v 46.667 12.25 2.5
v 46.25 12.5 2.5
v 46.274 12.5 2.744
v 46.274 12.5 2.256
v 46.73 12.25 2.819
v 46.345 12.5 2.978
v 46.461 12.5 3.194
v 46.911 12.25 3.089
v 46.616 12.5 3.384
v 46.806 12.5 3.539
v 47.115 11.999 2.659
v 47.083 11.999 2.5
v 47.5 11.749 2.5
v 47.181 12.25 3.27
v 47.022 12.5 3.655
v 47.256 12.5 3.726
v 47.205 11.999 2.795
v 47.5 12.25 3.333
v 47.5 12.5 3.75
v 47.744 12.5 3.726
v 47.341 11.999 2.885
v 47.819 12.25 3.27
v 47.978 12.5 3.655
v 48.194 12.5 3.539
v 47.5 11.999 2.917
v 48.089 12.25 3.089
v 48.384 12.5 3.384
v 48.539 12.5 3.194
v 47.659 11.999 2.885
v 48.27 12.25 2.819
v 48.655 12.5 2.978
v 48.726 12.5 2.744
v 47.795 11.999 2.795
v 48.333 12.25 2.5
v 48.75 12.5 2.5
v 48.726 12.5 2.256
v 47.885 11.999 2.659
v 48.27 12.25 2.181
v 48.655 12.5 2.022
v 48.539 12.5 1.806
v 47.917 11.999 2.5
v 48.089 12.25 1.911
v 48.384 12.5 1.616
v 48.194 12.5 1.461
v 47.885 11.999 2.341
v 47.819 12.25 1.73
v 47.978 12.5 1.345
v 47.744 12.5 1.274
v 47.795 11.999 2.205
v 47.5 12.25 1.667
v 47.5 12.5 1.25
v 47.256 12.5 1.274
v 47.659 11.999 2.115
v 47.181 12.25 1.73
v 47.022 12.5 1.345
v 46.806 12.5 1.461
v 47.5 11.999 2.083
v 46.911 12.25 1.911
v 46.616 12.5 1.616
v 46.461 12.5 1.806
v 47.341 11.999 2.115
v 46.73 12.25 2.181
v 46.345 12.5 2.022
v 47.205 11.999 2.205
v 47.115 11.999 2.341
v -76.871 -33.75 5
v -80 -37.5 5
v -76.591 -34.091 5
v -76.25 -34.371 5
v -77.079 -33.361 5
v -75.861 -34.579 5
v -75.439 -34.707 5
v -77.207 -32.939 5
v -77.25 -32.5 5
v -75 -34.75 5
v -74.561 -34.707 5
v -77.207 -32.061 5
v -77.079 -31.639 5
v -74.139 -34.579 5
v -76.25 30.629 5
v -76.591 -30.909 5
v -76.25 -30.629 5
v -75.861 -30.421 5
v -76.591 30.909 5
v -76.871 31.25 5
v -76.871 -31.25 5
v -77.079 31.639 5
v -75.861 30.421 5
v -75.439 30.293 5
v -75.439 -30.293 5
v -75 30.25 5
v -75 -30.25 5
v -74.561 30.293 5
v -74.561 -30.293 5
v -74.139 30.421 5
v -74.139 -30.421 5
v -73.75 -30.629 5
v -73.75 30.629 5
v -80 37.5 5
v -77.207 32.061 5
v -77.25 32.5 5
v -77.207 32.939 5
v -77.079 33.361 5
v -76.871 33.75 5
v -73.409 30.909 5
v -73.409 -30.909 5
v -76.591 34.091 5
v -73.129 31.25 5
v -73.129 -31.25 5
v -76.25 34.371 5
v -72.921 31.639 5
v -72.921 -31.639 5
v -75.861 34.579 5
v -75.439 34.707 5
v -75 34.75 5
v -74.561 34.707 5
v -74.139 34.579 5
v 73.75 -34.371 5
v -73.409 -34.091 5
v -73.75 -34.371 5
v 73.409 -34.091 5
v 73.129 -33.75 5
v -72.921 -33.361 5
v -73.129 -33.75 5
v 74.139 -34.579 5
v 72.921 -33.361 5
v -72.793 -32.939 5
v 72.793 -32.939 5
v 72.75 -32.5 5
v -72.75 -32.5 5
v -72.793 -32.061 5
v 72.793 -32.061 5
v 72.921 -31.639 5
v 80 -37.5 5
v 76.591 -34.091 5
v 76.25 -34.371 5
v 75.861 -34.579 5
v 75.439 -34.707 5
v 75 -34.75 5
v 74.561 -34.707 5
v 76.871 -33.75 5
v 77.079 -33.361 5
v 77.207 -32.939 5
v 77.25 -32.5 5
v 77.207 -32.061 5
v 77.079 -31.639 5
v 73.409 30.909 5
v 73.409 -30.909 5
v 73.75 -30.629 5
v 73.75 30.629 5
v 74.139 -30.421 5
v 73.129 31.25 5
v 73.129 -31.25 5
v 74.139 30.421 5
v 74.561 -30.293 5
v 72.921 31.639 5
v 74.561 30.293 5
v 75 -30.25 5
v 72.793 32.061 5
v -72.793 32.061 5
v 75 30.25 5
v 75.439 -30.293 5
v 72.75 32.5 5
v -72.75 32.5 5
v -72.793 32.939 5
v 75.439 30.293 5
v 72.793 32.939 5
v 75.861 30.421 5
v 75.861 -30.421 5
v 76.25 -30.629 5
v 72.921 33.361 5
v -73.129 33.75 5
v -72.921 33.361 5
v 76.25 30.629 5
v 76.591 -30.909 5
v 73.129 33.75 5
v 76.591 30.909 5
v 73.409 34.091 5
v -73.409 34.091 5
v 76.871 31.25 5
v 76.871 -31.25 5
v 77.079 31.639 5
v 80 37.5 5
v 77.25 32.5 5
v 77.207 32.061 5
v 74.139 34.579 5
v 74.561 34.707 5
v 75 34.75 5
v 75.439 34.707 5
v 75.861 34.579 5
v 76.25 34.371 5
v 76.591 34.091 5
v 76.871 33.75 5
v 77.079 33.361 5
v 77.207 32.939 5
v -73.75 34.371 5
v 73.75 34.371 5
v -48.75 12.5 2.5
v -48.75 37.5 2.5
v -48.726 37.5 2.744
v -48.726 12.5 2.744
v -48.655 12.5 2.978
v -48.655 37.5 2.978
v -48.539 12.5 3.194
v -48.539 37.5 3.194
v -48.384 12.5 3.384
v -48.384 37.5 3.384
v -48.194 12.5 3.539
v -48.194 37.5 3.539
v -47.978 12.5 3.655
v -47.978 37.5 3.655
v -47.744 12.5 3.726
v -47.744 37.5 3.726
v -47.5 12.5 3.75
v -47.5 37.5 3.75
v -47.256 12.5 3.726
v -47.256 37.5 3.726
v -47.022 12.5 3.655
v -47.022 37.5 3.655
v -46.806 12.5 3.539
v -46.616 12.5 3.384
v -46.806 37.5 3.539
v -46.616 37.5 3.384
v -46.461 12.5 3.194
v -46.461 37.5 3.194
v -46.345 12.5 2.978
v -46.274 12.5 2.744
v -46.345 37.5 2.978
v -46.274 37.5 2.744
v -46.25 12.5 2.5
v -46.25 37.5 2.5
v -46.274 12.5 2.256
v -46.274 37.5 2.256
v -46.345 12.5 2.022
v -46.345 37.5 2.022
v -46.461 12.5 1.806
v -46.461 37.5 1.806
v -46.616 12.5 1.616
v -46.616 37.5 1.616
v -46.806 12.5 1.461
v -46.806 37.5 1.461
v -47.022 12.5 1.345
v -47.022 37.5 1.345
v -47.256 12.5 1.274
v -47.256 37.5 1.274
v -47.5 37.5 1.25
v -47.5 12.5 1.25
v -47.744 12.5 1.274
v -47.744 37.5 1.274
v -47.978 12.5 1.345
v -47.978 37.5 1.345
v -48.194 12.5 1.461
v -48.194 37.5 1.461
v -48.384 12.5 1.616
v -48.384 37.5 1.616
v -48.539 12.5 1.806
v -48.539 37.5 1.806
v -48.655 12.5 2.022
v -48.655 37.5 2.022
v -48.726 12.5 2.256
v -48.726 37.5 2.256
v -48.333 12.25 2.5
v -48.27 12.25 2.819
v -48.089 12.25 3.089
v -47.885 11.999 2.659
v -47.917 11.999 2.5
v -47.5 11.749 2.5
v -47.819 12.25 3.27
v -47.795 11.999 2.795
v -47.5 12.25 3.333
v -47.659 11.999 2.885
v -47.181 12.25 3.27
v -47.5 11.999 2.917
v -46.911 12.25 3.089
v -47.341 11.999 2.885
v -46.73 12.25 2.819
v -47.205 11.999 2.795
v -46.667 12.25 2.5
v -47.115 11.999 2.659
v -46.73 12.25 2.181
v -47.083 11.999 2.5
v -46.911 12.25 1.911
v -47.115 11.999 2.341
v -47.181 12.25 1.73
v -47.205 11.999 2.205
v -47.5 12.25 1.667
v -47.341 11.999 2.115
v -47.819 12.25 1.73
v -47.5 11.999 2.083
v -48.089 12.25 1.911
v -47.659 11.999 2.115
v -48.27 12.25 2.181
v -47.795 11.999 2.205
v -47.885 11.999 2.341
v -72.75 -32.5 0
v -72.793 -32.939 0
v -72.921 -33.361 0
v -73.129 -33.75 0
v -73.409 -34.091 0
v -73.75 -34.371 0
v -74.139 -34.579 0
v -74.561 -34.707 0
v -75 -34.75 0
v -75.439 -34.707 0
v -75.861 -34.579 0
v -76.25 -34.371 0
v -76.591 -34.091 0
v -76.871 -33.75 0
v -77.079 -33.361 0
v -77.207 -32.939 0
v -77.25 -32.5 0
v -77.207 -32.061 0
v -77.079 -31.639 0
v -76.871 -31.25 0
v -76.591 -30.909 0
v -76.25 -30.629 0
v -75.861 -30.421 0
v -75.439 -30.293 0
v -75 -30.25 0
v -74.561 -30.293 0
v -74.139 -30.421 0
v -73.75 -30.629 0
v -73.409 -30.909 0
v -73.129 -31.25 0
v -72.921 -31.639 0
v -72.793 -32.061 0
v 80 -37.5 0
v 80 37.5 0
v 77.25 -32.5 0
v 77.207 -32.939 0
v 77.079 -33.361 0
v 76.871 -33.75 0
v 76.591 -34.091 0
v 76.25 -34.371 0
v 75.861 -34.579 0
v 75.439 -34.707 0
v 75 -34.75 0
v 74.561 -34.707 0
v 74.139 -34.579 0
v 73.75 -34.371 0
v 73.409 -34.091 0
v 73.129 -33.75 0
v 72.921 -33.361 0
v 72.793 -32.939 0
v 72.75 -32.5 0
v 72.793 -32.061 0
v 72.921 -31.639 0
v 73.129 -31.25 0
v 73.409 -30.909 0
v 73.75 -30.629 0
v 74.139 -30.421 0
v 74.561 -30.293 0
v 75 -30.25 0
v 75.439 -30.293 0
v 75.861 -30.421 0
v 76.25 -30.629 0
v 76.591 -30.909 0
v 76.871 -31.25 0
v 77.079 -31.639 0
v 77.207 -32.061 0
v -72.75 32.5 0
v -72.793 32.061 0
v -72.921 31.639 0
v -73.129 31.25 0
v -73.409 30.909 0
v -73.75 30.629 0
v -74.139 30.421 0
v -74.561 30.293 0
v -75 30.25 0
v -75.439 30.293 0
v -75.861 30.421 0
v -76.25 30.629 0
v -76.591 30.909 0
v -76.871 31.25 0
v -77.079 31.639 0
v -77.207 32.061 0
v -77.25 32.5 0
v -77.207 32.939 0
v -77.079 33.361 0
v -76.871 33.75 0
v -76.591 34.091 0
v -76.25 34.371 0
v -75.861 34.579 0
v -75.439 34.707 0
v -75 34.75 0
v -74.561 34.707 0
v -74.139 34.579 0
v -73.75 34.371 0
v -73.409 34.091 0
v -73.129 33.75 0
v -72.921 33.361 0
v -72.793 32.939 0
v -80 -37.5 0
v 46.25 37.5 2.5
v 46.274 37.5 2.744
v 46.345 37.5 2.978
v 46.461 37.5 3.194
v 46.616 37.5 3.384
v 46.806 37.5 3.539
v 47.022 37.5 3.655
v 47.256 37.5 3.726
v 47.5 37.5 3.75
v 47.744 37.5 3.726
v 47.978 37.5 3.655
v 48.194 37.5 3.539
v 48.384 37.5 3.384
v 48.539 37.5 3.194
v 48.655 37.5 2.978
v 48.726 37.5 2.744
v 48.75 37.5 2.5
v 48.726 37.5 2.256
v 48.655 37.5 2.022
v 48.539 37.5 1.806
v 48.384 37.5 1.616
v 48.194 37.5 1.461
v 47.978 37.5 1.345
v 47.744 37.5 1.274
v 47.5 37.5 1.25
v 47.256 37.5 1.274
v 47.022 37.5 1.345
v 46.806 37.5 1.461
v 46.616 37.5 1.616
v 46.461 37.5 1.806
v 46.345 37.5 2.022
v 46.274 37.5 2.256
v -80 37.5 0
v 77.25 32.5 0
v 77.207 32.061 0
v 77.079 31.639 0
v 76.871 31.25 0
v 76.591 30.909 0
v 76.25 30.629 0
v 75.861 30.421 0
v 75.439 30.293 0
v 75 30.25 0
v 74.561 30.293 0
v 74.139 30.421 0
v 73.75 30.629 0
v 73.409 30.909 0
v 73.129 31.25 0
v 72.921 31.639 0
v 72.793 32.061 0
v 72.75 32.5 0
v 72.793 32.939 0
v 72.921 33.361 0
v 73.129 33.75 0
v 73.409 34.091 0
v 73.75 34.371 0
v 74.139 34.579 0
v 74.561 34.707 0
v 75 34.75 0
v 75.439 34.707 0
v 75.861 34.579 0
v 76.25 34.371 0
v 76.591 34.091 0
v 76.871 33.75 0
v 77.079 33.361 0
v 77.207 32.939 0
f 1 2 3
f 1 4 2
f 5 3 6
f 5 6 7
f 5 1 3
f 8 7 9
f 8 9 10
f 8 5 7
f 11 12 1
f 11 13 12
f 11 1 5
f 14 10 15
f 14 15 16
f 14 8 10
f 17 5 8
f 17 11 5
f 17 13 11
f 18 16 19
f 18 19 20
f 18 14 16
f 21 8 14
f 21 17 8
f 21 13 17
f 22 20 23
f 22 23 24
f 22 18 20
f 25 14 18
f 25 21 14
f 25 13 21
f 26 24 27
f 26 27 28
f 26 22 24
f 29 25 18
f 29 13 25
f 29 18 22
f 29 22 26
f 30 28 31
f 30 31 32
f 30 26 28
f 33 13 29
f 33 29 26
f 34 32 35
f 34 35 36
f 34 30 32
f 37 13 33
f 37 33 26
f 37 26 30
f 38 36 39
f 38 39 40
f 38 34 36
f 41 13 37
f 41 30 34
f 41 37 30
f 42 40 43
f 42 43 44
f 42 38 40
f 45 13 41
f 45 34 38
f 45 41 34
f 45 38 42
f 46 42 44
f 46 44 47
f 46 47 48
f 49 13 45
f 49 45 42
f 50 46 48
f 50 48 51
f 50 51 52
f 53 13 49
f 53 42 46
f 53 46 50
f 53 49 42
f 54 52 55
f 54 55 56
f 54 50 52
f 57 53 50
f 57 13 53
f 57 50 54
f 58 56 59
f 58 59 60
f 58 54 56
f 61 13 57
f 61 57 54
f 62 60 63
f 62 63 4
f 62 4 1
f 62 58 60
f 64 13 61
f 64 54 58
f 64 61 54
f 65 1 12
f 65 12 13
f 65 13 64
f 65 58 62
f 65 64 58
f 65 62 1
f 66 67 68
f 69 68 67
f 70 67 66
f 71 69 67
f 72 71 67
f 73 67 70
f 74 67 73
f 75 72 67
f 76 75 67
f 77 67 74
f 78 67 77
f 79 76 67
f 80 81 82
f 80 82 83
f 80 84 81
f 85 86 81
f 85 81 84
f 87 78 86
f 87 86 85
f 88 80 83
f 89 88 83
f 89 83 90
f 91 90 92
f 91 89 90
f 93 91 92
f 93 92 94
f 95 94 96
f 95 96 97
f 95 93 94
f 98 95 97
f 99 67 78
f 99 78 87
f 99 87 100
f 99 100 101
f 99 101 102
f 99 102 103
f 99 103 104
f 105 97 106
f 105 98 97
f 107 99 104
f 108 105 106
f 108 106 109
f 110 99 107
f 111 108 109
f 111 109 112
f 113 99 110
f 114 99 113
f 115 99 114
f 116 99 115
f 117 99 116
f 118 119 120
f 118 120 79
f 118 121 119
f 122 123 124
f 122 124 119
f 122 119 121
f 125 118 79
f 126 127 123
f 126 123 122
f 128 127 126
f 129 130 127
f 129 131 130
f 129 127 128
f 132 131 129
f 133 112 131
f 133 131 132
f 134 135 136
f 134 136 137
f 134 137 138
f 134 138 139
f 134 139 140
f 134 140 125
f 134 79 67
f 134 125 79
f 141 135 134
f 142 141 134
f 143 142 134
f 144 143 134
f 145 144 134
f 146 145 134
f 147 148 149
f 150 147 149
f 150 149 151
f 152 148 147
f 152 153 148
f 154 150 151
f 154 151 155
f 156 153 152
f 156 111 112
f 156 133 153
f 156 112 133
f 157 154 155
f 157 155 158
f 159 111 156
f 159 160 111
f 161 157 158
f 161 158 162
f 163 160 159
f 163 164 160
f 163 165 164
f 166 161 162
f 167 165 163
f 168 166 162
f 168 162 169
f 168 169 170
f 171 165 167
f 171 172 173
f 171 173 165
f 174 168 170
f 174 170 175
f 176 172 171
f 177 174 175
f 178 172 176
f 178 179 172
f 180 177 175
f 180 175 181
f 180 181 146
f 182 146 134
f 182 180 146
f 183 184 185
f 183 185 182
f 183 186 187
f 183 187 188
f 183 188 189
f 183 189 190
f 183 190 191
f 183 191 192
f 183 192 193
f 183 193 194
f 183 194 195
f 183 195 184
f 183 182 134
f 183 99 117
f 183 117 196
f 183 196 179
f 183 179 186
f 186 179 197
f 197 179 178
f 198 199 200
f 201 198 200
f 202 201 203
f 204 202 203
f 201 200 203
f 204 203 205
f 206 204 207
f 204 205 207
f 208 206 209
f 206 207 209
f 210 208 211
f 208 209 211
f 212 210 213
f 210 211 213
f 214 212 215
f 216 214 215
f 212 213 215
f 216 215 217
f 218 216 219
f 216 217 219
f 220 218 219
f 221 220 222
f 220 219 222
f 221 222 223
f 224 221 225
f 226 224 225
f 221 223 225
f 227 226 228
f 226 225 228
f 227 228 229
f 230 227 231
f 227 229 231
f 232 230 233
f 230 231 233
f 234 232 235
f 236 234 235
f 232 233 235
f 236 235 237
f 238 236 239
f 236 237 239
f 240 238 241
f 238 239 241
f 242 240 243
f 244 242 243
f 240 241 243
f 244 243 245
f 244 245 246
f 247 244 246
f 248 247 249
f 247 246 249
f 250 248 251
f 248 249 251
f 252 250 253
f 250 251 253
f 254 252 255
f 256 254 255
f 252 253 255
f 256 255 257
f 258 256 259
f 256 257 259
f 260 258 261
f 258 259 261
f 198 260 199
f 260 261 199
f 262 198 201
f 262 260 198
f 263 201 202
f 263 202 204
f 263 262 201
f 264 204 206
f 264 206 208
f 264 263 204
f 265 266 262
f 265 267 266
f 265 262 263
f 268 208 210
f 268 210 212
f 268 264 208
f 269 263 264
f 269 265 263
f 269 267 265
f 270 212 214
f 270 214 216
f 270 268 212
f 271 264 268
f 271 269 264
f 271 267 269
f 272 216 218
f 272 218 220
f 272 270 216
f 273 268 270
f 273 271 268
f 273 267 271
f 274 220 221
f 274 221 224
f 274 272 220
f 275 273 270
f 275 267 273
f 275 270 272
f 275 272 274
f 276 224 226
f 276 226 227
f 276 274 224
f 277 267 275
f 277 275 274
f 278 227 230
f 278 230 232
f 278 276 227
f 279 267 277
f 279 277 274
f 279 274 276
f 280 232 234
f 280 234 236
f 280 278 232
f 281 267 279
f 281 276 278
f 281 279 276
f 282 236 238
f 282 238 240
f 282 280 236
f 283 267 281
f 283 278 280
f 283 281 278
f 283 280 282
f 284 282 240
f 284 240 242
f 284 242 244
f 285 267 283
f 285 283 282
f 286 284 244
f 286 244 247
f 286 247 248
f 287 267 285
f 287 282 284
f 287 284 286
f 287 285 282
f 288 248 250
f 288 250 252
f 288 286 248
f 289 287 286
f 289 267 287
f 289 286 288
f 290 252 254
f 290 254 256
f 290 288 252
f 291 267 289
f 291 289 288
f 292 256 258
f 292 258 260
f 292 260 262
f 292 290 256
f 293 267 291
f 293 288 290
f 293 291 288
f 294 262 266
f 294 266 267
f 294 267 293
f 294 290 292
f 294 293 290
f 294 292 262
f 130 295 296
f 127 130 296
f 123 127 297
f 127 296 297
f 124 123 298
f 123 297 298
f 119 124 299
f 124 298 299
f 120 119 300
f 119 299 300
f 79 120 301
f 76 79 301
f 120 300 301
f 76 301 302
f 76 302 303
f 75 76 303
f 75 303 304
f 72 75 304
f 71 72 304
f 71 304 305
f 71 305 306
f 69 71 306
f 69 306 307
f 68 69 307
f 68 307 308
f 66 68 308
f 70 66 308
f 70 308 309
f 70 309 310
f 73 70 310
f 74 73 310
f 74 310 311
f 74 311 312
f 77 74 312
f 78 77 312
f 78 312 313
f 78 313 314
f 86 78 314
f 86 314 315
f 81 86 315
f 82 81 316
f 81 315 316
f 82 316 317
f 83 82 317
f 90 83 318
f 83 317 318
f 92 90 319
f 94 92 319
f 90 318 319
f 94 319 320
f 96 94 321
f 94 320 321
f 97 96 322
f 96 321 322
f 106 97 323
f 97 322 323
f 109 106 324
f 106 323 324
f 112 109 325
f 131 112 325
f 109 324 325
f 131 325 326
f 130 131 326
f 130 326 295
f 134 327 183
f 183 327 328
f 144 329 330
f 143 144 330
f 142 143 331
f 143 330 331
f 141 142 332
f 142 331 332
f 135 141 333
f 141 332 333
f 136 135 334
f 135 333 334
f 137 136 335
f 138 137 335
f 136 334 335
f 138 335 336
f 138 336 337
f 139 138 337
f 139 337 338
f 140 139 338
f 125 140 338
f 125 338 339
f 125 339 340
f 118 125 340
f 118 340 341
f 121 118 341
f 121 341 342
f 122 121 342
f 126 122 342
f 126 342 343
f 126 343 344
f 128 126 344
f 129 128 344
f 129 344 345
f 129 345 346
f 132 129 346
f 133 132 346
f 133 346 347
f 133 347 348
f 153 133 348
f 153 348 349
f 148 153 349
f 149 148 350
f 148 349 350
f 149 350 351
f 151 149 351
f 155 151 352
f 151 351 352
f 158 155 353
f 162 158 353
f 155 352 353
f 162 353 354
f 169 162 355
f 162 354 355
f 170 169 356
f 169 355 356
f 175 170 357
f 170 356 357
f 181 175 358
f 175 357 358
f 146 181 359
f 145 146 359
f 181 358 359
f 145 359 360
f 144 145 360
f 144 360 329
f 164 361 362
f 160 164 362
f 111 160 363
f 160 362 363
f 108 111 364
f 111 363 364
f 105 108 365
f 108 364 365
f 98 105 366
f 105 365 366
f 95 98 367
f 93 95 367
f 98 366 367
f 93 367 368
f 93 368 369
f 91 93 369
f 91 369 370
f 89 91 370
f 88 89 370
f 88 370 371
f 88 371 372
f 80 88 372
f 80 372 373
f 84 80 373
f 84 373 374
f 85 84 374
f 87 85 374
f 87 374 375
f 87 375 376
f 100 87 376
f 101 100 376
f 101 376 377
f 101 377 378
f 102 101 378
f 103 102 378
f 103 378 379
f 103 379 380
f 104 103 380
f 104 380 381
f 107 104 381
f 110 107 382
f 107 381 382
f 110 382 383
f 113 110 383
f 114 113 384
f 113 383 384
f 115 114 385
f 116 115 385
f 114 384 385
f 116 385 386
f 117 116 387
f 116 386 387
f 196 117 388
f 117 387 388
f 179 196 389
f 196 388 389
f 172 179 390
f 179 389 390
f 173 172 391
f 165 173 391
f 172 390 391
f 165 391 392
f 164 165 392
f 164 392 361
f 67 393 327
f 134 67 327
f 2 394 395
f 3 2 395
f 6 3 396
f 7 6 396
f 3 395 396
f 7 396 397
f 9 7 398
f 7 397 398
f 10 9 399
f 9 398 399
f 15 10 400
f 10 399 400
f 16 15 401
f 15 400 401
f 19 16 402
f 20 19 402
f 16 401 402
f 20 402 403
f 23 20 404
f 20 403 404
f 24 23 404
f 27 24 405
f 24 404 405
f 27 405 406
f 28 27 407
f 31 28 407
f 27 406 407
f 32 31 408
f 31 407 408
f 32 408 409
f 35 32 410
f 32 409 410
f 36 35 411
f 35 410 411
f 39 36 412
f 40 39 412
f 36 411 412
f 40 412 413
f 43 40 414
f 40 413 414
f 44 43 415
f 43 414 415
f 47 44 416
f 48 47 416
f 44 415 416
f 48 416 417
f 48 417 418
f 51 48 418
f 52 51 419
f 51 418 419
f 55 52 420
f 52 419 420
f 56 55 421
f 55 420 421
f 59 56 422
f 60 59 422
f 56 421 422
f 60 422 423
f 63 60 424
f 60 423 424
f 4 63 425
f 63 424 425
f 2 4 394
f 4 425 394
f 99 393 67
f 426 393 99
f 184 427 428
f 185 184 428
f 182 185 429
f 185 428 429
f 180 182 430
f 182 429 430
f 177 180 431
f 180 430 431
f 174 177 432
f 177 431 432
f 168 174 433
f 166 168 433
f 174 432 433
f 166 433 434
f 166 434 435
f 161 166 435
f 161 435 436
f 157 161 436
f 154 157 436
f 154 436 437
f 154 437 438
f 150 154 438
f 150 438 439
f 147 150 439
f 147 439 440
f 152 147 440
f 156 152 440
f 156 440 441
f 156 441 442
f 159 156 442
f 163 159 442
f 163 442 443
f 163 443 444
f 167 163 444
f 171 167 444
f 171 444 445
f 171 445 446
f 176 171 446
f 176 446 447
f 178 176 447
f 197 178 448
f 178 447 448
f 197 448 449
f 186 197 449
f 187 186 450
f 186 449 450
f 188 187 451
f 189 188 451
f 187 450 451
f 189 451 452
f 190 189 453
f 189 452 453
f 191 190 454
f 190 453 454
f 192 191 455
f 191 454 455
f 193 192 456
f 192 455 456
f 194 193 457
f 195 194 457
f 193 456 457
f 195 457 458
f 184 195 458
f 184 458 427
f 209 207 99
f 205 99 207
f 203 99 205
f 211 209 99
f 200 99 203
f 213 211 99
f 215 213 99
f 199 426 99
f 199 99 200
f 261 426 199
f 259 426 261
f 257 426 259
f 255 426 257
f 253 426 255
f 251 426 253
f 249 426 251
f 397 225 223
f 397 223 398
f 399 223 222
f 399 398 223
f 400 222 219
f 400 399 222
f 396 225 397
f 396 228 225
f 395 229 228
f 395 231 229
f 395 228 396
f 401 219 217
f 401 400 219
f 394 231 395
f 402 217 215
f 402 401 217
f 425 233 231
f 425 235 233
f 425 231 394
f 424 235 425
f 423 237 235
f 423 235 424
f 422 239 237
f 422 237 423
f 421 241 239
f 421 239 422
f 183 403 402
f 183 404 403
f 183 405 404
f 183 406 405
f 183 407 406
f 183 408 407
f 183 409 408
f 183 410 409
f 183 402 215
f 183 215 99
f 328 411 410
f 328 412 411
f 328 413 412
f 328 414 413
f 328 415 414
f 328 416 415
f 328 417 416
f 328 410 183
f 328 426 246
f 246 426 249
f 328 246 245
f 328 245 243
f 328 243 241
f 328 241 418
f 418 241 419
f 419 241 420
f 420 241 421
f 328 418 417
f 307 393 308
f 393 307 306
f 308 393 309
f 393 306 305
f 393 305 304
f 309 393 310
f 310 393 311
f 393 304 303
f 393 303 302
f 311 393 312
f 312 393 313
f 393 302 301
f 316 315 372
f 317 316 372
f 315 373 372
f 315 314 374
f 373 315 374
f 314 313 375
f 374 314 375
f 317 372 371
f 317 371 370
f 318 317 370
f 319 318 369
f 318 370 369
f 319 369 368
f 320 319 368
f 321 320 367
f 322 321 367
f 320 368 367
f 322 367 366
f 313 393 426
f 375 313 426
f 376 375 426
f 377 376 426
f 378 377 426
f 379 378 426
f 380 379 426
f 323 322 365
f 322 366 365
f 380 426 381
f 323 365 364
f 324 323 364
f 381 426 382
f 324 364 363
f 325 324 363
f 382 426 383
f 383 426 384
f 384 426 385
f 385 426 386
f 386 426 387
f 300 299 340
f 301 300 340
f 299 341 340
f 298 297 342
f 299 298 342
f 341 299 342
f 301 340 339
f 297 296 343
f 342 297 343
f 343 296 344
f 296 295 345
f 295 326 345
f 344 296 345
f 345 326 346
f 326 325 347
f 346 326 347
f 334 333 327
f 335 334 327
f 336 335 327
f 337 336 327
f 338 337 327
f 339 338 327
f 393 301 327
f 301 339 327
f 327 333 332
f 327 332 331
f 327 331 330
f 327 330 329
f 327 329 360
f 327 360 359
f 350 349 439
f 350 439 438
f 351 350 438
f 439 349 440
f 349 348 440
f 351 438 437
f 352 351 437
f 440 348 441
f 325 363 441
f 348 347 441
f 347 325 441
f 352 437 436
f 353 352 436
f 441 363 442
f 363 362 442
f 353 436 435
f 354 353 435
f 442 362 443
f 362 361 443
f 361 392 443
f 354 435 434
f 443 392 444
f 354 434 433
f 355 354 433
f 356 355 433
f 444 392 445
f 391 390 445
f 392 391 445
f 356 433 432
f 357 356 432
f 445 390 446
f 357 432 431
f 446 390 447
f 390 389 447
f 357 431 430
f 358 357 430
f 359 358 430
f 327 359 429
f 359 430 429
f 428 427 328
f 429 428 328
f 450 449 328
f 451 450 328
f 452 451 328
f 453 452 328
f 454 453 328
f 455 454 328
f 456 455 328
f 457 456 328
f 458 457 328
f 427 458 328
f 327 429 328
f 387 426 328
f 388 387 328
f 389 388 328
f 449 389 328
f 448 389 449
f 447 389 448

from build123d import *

# Parameters (mm, degrees)
SKETCH_W       = 160
SKETCH_H       = 75
PAD_DEPTH      = 5
SKETCH001_R    = 2.25
HOLE_DEPTH     = 5.001
SKETCH002_R    = 1.25
HOLE001_DEPTH  = 25
HOLE001_TIPS_R = 1.25


with BuildPart() as part:
    # Sketch → Pad (new body)
    with BuildSketch(Plane.XY):
        Rectangle(SKETCH_W, SKETCH_H)
    extrude(amount=PAD_DEPTH)

    # Sketch001 (on Face5 of Pad) → Hole (cut, through all)
    with BuildSketch(Plane(origin=(0, 0, 0), x_dir=(1, 0, 0), z_dir=(0, 0, -1))):
        with Locations((-75, 32.5)):
            Circle(SKETCH001_R)
        with Locations((75, 32.5)):
            Circle(SKETCH001_R)
        with Locations((75, -32.5)):
            Circle(SKETCH001_R)
        with Locations((-75, -32.5)):
            Circle(SKETCH001_R)
    extrude(amount=-HOLE_DEPTH, mode=Mode.SUBTRACT)

    # Sketch002 (on Face1 of Hole) → Hole001 (cut)
    with BuildSketch(Plane(origin=(0, 37.5, 0), x_dir=(-1, 0, 0), z_dir=(0, 1, 0))):
        with Locations((-47.5, 2.5)):
            Circle(SKETCH002_R)
        with Locations((47.5, 2.5)):
            Circle(SKETCH002_R)
    extrude(amount=-HOLE001_DEPTH, mode=Mode.SUBTRACT)

    # Hole001 tips → Hole001 tip 1 section 0
    with BuildSketch(Plane(origin=(0, 12.5, 0), x_dir=(-1, 0, 0), z_dir=(0, 1, 0)), mode=Mode.PRIVATE) as hole001_tip_1_s0:
        with Locations((-47.5, 2.5)):
            Circle(HOLE001_TIPS_R)
    loft([hole001_tip_1_s0.sketch, Vertex(47.5, 11.748924, 2.5)], mode=Mode.SUBTRACT)

    # Hole001 tips → Hole001 tip 2 section 0
    with BuildSketch(Plane(origin=(0, 12.5, 0), x_dir=(-1, 0, 0), z_dir=(0, 1, 0)), mode=Mode.PRIVATE) as hole001_tip_2_s0:
        with Locations((47.5, 2.5)):
            Circle(HOLE001_TIPS_R)
    loft([hole001_tip_2_s0.sketch, Vertex(-47.5, 11.748924, 2.5)], mode=Mode.SUBTRACT)


solid = part.part
